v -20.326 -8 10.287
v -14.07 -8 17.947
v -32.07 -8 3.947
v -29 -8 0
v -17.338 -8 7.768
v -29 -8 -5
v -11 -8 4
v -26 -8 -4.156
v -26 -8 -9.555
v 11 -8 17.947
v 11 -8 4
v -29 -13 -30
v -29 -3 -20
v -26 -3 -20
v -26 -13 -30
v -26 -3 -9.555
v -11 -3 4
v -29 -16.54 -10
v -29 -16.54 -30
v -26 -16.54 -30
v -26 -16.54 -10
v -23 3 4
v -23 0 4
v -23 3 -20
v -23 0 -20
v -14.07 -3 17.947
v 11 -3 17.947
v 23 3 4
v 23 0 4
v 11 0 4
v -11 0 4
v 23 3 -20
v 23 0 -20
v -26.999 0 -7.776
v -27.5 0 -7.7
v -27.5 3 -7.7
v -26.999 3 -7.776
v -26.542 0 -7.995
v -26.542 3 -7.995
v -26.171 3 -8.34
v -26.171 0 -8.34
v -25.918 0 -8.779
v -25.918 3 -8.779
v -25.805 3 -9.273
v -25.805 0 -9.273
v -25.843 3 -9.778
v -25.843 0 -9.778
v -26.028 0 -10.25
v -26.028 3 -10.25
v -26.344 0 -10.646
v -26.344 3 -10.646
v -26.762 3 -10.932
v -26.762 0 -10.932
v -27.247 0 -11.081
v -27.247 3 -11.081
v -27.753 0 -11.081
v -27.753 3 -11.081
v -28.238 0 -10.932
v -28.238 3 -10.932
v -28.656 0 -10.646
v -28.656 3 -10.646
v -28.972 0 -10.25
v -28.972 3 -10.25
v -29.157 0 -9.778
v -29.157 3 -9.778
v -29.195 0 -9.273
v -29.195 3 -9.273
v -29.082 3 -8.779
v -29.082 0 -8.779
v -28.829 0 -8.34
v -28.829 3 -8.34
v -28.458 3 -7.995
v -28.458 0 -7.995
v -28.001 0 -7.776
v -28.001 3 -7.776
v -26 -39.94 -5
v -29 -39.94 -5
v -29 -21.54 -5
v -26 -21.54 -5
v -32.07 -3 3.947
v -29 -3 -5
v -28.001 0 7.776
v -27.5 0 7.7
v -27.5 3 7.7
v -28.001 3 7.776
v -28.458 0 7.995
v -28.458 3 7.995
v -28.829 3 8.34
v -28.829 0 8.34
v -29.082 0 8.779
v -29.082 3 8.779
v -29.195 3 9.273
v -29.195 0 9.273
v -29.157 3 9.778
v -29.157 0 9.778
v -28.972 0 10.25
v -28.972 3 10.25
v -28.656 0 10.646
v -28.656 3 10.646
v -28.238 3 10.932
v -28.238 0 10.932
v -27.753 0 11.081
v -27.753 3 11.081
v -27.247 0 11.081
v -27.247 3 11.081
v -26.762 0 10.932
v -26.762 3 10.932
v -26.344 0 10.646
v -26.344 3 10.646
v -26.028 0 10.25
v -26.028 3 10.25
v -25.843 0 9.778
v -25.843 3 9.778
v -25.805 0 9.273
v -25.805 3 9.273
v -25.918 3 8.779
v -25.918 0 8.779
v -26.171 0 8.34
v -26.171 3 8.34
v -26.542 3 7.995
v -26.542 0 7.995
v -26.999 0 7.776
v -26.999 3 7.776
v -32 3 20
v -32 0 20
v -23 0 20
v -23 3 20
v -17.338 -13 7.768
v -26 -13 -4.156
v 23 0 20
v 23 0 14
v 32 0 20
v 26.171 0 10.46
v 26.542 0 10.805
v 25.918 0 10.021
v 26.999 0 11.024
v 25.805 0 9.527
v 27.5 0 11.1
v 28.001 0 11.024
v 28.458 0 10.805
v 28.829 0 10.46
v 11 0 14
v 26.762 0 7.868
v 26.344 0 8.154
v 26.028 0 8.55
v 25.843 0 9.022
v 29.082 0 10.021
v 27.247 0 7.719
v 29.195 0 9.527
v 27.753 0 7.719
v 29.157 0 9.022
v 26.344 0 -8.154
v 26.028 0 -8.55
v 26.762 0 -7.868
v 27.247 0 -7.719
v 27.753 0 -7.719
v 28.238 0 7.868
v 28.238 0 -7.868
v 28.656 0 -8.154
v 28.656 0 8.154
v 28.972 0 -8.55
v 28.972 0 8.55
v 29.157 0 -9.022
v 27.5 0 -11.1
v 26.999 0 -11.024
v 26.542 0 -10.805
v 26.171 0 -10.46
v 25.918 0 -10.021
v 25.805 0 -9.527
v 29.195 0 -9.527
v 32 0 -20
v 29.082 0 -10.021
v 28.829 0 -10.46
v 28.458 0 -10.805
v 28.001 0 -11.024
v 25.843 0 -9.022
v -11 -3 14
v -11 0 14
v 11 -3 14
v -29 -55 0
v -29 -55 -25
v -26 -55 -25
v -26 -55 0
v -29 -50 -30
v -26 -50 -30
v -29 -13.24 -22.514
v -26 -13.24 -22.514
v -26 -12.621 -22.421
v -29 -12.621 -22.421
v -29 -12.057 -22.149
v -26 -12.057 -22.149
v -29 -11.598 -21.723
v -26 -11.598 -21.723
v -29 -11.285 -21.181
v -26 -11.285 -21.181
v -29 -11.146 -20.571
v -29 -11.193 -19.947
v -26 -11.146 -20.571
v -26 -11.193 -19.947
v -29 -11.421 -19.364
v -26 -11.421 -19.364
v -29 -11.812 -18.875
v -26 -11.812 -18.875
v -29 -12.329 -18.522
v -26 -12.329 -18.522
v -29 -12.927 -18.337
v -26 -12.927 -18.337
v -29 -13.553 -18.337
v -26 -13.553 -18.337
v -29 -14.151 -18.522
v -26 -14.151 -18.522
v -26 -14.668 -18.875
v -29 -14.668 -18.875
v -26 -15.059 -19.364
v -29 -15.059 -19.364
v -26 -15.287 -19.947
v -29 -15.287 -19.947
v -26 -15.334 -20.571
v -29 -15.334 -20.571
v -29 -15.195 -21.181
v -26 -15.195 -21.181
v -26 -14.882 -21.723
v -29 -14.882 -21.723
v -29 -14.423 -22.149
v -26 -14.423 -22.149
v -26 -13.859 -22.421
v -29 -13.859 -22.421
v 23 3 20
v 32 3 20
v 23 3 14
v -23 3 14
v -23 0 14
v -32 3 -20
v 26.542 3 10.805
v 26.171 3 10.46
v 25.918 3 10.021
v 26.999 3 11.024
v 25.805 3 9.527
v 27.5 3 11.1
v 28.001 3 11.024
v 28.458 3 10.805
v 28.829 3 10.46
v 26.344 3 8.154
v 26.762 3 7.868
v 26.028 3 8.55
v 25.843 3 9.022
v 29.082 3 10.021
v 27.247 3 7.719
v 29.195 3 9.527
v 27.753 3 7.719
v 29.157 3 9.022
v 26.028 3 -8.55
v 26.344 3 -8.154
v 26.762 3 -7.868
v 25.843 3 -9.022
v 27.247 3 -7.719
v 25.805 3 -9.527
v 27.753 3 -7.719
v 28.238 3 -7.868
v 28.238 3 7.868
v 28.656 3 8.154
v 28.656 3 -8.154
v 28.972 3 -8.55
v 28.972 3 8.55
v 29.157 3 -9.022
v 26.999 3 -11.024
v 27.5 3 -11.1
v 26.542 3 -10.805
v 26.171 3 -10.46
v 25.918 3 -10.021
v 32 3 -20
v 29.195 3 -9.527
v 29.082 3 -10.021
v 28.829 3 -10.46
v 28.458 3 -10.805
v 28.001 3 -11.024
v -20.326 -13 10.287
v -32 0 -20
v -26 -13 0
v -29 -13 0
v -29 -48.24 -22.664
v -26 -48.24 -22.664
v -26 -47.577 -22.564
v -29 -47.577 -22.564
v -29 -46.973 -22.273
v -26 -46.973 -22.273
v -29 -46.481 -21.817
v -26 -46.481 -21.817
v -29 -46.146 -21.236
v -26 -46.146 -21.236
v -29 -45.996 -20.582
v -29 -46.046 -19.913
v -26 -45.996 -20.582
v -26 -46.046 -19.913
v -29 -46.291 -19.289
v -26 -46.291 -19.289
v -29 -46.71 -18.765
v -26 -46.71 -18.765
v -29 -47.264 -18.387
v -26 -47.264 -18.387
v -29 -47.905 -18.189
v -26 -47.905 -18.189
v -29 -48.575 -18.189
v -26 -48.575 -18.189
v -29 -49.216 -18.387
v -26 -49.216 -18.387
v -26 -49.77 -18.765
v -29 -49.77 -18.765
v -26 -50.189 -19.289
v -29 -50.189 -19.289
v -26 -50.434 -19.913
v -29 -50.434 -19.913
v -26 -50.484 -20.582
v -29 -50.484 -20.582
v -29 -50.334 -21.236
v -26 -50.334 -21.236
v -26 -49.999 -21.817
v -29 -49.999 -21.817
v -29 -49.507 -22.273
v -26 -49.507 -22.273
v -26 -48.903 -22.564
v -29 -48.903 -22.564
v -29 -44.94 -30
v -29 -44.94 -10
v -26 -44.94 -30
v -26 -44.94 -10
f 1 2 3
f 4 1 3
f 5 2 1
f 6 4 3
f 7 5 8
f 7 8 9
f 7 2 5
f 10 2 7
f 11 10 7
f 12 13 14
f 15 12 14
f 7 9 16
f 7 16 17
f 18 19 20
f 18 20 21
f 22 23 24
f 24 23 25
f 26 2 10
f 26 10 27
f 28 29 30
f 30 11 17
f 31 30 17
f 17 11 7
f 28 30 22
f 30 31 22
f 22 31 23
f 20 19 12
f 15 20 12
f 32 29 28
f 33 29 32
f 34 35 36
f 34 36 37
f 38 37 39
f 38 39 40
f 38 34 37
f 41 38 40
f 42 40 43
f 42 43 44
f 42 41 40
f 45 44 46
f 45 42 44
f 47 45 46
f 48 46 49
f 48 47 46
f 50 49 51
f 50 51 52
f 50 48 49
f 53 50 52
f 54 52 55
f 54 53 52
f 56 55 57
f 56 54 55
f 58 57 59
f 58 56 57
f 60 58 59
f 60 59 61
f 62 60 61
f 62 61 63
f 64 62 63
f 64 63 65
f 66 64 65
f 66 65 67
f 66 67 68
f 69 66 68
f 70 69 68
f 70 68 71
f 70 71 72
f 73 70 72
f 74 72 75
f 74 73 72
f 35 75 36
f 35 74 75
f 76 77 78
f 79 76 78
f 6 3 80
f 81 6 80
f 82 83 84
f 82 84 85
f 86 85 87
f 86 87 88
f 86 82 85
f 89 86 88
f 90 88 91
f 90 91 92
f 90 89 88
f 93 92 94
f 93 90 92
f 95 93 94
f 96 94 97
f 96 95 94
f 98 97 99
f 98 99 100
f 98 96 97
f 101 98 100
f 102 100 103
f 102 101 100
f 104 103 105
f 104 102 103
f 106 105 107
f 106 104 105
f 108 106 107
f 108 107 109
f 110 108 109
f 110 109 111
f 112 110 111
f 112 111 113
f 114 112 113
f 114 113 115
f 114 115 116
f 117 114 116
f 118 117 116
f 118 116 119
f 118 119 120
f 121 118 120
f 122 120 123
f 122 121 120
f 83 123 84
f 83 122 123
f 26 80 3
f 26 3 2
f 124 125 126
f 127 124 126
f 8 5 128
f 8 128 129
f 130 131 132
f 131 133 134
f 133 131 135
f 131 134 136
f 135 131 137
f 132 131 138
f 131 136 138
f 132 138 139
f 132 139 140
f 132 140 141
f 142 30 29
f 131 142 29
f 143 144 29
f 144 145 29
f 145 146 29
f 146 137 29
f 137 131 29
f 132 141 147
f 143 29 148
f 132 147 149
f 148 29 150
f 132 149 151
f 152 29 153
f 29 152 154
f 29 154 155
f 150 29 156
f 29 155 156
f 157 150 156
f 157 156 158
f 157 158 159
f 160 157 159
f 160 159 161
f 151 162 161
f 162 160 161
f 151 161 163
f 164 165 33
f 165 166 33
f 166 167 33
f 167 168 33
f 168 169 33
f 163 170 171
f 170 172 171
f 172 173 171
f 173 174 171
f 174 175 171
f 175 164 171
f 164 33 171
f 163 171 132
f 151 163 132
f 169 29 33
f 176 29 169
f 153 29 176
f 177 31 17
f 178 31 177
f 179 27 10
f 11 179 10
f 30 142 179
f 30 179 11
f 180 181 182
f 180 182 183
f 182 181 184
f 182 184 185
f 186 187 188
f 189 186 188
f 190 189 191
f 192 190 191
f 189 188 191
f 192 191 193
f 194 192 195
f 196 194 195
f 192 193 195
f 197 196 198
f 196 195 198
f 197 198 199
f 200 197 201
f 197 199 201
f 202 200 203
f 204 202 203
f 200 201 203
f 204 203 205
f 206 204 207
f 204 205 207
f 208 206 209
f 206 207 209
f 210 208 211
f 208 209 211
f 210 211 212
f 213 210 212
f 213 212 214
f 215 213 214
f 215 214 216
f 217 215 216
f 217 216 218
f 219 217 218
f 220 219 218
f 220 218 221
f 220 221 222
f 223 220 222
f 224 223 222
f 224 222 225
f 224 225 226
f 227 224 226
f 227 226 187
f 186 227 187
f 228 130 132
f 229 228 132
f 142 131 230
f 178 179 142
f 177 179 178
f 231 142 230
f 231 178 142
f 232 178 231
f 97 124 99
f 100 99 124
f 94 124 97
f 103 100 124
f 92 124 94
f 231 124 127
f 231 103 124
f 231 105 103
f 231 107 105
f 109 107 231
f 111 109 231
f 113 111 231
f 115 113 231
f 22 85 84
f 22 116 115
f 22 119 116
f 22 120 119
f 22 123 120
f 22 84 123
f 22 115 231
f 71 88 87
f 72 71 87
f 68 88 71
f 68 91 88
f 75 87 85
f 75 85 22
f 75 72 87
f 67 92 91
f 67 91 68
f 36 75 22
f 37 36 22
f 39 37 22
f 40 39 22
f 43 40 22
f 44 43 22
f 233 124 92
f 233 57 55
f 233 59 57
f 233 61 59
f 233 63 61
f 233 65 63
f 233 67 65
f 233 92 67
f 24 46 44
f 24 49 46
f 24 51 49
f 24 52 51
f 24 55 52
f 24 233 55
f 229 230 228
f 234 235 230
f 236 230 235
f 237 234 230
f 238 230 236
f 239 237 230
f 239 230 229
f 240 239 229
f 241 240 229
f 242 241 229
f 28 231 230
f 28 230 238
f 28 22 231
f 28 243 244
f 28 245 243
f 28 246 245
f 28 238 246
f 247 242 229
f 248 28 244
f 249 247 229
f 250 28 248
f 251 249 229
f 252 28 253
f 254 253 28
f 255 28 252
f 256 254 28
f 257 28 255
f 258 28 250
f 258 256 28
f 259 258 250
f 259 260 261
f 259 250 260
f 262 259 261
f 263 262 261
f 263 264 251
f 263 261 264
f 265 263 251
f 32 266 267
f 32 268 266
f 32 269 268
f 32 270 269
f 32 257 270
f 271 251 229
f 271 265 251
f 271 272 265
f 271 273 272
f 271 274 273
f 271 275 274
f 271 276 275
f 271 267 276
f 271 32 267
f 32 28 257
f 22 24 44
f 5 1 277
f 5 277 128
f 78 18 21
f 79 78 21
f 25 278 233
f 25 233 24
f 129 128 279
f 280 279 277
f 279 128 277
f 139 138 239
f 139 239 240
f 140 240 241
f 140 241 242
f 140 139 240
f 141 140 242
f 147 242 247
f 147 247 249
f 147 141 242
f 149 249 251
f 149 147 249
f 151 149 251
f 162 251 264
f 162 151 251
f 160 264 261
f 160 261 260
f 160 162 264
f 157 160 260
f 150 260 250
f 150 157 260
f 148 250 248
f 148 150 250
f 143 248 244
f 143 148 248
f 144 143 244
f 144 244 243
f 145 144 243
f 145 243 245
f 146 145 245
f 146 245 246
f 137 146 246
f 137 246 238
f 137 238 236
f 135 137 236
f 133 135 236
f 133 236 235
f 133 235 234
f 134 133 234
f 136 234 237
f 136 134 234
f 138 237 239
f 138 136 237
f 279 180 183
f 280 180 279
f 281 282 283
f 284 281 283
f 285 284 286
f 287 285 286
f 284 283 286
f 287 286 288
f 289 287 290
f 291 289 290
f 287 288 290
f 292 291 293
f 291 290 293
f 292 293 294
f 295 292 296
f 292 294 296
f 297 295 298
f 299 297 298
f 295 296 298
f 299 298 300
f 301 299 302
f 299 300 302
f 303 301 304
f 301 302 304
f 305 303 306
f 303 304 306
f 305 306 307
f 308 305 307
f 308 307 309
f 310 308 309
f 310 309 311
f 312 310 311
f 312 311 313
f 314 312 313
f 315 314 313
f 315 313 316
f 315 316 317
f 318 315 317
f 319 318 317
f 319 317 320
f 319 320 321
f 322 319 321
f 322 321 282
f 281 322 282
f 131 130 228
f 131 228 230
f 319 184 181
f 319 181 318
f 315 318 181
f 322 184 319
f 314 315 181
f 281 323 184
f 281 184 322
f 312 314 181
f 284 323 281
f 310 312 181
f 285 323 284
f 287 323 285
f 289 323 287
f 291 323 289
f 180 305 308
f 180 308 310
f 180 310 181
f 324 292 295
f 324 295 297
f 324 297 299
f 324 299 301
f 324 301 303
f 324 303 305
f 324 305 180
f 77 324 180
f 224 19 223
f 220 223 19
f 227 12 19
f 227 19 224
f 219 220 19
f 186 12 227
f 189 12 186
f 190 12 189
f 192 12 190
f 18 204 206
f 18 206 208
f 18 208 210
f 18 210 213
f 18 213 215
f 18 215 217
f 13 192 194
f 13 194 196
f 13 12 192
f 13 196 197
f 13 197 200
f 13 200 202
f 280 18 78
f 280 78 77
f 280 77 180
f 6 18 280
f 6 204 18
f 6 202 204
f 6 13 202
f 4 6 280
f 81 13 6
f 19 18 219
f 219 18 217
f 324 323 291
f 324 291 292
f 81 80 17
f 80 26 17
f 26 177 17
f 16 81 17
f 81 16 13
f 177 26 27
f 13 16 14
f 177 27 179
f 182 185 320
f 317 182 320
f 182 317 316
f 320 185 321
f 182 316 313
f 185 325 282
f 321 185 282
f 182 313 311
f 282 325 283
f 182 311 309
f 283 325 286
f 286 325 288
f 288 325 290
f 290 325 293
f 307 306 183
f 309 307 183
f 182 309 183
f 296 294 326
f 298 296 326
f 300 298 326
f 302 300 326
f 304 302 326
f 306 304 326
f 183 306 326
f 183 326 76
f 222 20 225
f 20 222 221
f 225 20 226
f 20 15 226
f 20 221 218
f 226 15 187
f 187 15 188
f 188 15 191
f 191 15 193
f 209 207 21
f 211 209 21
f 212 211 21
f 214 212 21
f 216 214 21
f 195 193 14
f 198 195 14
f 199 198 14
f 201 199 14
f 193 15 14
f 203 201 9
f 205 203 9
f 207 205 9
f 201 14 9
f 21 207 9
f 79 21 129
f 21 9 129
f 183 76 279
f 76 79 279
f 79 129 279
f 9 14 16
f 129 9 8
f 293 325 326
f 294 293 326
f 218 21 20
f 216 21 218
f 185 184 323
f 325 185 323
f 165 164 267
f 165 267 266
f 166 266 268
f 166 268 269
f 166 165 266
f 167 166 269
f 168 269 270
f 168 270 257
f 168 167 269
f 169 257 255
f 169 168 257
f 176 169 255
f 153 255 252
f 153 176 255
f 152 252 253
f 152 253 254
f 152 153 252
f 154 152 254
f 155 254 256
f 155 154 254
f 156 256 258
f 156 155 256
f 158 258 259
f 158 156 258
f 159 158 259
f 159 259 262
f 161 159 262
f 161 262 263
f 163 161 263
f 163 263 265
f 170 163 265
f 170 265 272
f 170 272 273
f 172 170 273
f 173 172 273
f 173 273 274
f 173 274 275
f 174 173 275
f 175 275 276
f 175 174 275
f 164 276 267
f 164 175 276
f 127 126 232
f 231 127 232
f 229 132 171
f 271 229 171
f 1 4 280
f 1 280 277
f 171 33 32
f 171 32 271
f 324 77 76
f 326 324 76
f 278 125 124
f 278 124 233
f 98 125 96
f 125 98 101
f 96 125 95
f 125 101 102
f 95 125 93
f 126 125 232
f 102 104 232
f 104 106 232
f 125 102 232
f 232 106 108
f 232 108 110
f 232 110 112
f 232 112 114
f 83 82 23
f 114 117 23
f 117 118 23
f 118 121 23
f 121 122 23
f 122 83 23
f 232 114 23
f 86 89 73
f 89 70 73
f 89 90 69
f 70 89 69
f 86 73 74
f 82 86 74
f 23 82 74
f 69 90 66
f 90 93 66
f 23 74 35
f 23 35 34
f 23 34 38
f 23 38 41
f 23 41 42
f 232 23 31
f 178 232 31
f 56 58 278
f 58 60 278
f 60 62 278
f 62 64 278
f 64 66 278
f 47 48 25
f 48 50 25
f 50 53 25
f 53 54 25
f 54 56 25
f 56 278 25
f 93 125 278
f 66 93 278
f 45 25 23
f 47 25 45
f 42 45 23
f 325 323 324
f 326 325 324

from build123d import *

# Parameters (mm, degrees)
SKETCH_1_W          = 9
SKETCH_1_H          = 40
SKETCH_1_R          = 1.7
EXTRUDE_1_DEPTH     = 3
EXTRUDE_1_2_DEPTH   = 3
SKETCH_2_W          = 46
SKETCH_2_H          = 10
EXTRUDE_2_DEPTH     = 3
SKETCH_3_W          = 22
SKETCH_3_H          = 10
EXTRUDE_3_DEPTH     = 8
EXTRUDE_5_DEPTH     = 5
SKETCH_11_W         = 30
SKETCH_11_H         = 52
EXTRUDE_6_DEPTH     = 3
SKETCH_12_R         = 2.1
SKETCH_12_R_2       = 2.25
CUT_EXTRUDE_3_DEPTH = 13
SKETCH_13_W         = 25
SKETCH_13_H         = 28.4
CUT_EXTRUDE_4_DEPTH = 13
CHAMFER_3_SIZE      = 10
CHAMFER_4_SIZE      = 5
CHAMFER_5_SIZE      = 5
SKETCH_14_W         = 22.803508502
SKETCH_14_H         = 5
EXTRUDE_7_DEPTH     = 5
EXTRUDE_8_REACH     = 78.026
SKETCH_15_W         = 3.946761087
SKETCH_15_H         = 5
CHAMFER_6_SIZE      = 5
EXTRUDE_9_DEPTH     = 5


with BuildPart() as part:
    # 草图1 → 凸台-拉伸1 (new body)
    with BuildSketch(Plane(origin=(0, 0, 0), x_dir=(1, 0, 0), z_dir=(0, 1, 0))):
        with Locations((27.5, 0)):
            Rectangle(SKETCH_1_W, SKETCH_1_H)
        with Locations(Location((27.5, 9.4, 0), (0, 0, 90))):
            Circle(SKETCH_1_R, mode=Mode.SUBTRACT)
        with Locations(Location((27.5, -9.4, 0), (0, 0, 270))):
            Circle(SKETCH_1_R, mode=Mode.SUBTRACT)
    extrude(amount=EXTRUDE_1_DEPTH)



with BuildPart() as body_2:
    # 草图1 → Extrude 1 2 (new body)
    with BuildSketch(Plane(origin=(0, 0, 0), x_dir=(1, 0, 0), z_dir=(0, 1, 0))):
        with Locations((-27.5, 0)):
            Rectangle(SKETCH_1_W, SKETCH_1_H)
        with Locations(Location((-27.5, 9.4, 0), (0, 0, 270))):
            Circle(SKETCH_1_R, mode=Mode.SUBTRACT)
        with Locations(Location((-27.5, -9.4, 0), (0, 0, 90))):
            Circle(SKETCH_1_R, mode=Mode.SUBTRACT)
    extrude(amount=EXTRUDE_1_2_DEPTH)


with BuildPart() as part_1:
    add(part.part)

    add(body_2.part)  # 凸台-拉伸2 merges body 2
    # 草图2 → 凸台-拉伸2 (add)
    with BuildSketch(Plane(origin=(0, 0, 0), x_dir=(-1, 0, 0), z_dir=(0, -1, 0))):
        with Locations((0, -9)):
            Rectangle(SKETCH_2_W, SKETCH_2_H)
    extrude(amount=-EXTRUDE_2_DEPTH)

    # 草图3 → 凸台-拉伸3 (add)
    with BuildSketch(Plane.XZ):
        with Locations((0, 9)):
            Rectangle(SKETCH_3_W, SKETCH_3_H)
    extrude(amount=EXTRUDE_3_DEPTH)

    # 草图10 → 凸台-拉伸5 (add)
    with BuildSketch(Plane.XZ.offset(8)):
        Polygon((-11, 14), (-29, 0), (-29, -12.266402166), (-11, 4), align=None)
    extrude(amount=-EXTRUDE_5_DEPTH)

    # 草图11 → 凸台-拉伸6 (add)
    with BuildSketch(Plane.ZY.offset(29)):
        with Locations((-15, -29)):
            Rectangle(SKETCH_11_W, SKETCH_11_H)
    extrude(amount=-EXTRUDE_6_DEPTH)

    # 草图12 → 切除-拉伸3 (cut)
    with BuildSketch(Plane(origin=(-26, 0, 0), x_dir=(0, 0, -1), z_dir=(1, 0, 0))):
        with Locations((20.414, -13.24)):
            Circle(SKETCH_12_R)
        with Locations((20.414, -48.24)):
            Circle(SKETCH_12_R_2)
    extrude(amount=-CUT_EXTRUDE_3_DEPTH, mode=Mode.SUBTRACT)

    # 草图13 → 切除-拉伸4 (cut)
    with BuildSketch(Plane.ZY.offset(29)):
        with Locations((-17.5, -30.74)):
            Rectangle(SKETCH_13_W, SKETCH_13_H)
    extrude(amount=-CUT_EXTRUDE_4_DEPTH, mode=Mode.SUBTRACT)

    # 倒角3
    chamfer_3_edges = [part_1.edges().sort_by_distance(p)[0] for p in [
        (-27.5, -3, -30),
    ]]
    chamfer(chamfer_3_edges, length=CHAMFER_3_SIZE)

    # 倒角4
    chamfer_4_edges = [part_1.edges().sort_by_distance(p)[0] for p in [
        (-27.5, -55, -30),
    ]]
    chamfer(chamfer_4_edges, length=CHAMFER_4_SIZE)

    # 倒角5
    chamfer_5_edges = [part_1.edges().sort_by_distance(p)[0] for p in [
        (-27.5, -16.54, -5),
        (-27.5, -44.94, -5),
    ]]
    chamfer(chamfer_5_edges, length=CHAMFER_5_SIZE)

    # 草图14 → 凸台-拉伸7 (add)
    with BuildSketch(Plane(origin=(-10.930769231, 0, 14.053846154), x_dir=(0.7893522173763264, 0, 0.6139406135149205), z_dir=(-0.6139406135149205, 0, 0.7893522173763264))):
        with Locations((-11.489460053, -5.5)):
            Rectangle(SKETCH_14_W, SKETCH_14_H)
    extrude(amount=EXTRUDE_7_DEPTH)

    # 凸台-拉伸8: up to this plane
    extrude_8_end = Plane(origin=(-14.000472298, 0, 18.000607241), z_dir=(-0.6139406135149204, 0, 0.7893522173763263))
    # 草图15 → 凸台-拉伸8 (add, up to the surface)
    with BuildSketch(Plane(origin=(11, 0, 0), x_dir=(0, 0, -1), z_dir=(1, 0, 0)), mode=Mode.PRIVATE) as extrude_8_sk1:
        with Locations((-15.973380544, -5.5)):
            Rectangle(SKETCH_15_W, SKETCH_15_H)
    extrude_8_tool1 = split(extrude(extrude_8_sk1.sketch, amount=-EXTRUDE_8_REACH, mode=Mode.PRIVATE), bisect_by=extrude_8_end, keep=Keep.BOTH, mode=Mode.PRIVATE)
    add(extrude_8_tool1.solids().sort_by_distance((11, -5.5, 15.973381))[0])

    # 倒角6
    chamfer_6_edges = [part_1.edges().sort_by_distance(p)[0] for p in [
        (-29, -5.5, 0),
    ]]
    chamfer(chamfer_6_edges, length=CHAMFER_6_SIZE - 0.0001)  # a hair under: the kernel refuses the full size

    # 草图17 → 凸台-拉伸9 (add)
    with BuildSketch(Plane.XZ.offset(8)):
        Polygon((-29, 0), (-20.325921578, 10.286880116), (-17.338272835, 7.767642096), (-26, -4.155710702), align=None)
    extrude(amount=EXTRUDE_9_DEPTH)


solid = part_1.part
